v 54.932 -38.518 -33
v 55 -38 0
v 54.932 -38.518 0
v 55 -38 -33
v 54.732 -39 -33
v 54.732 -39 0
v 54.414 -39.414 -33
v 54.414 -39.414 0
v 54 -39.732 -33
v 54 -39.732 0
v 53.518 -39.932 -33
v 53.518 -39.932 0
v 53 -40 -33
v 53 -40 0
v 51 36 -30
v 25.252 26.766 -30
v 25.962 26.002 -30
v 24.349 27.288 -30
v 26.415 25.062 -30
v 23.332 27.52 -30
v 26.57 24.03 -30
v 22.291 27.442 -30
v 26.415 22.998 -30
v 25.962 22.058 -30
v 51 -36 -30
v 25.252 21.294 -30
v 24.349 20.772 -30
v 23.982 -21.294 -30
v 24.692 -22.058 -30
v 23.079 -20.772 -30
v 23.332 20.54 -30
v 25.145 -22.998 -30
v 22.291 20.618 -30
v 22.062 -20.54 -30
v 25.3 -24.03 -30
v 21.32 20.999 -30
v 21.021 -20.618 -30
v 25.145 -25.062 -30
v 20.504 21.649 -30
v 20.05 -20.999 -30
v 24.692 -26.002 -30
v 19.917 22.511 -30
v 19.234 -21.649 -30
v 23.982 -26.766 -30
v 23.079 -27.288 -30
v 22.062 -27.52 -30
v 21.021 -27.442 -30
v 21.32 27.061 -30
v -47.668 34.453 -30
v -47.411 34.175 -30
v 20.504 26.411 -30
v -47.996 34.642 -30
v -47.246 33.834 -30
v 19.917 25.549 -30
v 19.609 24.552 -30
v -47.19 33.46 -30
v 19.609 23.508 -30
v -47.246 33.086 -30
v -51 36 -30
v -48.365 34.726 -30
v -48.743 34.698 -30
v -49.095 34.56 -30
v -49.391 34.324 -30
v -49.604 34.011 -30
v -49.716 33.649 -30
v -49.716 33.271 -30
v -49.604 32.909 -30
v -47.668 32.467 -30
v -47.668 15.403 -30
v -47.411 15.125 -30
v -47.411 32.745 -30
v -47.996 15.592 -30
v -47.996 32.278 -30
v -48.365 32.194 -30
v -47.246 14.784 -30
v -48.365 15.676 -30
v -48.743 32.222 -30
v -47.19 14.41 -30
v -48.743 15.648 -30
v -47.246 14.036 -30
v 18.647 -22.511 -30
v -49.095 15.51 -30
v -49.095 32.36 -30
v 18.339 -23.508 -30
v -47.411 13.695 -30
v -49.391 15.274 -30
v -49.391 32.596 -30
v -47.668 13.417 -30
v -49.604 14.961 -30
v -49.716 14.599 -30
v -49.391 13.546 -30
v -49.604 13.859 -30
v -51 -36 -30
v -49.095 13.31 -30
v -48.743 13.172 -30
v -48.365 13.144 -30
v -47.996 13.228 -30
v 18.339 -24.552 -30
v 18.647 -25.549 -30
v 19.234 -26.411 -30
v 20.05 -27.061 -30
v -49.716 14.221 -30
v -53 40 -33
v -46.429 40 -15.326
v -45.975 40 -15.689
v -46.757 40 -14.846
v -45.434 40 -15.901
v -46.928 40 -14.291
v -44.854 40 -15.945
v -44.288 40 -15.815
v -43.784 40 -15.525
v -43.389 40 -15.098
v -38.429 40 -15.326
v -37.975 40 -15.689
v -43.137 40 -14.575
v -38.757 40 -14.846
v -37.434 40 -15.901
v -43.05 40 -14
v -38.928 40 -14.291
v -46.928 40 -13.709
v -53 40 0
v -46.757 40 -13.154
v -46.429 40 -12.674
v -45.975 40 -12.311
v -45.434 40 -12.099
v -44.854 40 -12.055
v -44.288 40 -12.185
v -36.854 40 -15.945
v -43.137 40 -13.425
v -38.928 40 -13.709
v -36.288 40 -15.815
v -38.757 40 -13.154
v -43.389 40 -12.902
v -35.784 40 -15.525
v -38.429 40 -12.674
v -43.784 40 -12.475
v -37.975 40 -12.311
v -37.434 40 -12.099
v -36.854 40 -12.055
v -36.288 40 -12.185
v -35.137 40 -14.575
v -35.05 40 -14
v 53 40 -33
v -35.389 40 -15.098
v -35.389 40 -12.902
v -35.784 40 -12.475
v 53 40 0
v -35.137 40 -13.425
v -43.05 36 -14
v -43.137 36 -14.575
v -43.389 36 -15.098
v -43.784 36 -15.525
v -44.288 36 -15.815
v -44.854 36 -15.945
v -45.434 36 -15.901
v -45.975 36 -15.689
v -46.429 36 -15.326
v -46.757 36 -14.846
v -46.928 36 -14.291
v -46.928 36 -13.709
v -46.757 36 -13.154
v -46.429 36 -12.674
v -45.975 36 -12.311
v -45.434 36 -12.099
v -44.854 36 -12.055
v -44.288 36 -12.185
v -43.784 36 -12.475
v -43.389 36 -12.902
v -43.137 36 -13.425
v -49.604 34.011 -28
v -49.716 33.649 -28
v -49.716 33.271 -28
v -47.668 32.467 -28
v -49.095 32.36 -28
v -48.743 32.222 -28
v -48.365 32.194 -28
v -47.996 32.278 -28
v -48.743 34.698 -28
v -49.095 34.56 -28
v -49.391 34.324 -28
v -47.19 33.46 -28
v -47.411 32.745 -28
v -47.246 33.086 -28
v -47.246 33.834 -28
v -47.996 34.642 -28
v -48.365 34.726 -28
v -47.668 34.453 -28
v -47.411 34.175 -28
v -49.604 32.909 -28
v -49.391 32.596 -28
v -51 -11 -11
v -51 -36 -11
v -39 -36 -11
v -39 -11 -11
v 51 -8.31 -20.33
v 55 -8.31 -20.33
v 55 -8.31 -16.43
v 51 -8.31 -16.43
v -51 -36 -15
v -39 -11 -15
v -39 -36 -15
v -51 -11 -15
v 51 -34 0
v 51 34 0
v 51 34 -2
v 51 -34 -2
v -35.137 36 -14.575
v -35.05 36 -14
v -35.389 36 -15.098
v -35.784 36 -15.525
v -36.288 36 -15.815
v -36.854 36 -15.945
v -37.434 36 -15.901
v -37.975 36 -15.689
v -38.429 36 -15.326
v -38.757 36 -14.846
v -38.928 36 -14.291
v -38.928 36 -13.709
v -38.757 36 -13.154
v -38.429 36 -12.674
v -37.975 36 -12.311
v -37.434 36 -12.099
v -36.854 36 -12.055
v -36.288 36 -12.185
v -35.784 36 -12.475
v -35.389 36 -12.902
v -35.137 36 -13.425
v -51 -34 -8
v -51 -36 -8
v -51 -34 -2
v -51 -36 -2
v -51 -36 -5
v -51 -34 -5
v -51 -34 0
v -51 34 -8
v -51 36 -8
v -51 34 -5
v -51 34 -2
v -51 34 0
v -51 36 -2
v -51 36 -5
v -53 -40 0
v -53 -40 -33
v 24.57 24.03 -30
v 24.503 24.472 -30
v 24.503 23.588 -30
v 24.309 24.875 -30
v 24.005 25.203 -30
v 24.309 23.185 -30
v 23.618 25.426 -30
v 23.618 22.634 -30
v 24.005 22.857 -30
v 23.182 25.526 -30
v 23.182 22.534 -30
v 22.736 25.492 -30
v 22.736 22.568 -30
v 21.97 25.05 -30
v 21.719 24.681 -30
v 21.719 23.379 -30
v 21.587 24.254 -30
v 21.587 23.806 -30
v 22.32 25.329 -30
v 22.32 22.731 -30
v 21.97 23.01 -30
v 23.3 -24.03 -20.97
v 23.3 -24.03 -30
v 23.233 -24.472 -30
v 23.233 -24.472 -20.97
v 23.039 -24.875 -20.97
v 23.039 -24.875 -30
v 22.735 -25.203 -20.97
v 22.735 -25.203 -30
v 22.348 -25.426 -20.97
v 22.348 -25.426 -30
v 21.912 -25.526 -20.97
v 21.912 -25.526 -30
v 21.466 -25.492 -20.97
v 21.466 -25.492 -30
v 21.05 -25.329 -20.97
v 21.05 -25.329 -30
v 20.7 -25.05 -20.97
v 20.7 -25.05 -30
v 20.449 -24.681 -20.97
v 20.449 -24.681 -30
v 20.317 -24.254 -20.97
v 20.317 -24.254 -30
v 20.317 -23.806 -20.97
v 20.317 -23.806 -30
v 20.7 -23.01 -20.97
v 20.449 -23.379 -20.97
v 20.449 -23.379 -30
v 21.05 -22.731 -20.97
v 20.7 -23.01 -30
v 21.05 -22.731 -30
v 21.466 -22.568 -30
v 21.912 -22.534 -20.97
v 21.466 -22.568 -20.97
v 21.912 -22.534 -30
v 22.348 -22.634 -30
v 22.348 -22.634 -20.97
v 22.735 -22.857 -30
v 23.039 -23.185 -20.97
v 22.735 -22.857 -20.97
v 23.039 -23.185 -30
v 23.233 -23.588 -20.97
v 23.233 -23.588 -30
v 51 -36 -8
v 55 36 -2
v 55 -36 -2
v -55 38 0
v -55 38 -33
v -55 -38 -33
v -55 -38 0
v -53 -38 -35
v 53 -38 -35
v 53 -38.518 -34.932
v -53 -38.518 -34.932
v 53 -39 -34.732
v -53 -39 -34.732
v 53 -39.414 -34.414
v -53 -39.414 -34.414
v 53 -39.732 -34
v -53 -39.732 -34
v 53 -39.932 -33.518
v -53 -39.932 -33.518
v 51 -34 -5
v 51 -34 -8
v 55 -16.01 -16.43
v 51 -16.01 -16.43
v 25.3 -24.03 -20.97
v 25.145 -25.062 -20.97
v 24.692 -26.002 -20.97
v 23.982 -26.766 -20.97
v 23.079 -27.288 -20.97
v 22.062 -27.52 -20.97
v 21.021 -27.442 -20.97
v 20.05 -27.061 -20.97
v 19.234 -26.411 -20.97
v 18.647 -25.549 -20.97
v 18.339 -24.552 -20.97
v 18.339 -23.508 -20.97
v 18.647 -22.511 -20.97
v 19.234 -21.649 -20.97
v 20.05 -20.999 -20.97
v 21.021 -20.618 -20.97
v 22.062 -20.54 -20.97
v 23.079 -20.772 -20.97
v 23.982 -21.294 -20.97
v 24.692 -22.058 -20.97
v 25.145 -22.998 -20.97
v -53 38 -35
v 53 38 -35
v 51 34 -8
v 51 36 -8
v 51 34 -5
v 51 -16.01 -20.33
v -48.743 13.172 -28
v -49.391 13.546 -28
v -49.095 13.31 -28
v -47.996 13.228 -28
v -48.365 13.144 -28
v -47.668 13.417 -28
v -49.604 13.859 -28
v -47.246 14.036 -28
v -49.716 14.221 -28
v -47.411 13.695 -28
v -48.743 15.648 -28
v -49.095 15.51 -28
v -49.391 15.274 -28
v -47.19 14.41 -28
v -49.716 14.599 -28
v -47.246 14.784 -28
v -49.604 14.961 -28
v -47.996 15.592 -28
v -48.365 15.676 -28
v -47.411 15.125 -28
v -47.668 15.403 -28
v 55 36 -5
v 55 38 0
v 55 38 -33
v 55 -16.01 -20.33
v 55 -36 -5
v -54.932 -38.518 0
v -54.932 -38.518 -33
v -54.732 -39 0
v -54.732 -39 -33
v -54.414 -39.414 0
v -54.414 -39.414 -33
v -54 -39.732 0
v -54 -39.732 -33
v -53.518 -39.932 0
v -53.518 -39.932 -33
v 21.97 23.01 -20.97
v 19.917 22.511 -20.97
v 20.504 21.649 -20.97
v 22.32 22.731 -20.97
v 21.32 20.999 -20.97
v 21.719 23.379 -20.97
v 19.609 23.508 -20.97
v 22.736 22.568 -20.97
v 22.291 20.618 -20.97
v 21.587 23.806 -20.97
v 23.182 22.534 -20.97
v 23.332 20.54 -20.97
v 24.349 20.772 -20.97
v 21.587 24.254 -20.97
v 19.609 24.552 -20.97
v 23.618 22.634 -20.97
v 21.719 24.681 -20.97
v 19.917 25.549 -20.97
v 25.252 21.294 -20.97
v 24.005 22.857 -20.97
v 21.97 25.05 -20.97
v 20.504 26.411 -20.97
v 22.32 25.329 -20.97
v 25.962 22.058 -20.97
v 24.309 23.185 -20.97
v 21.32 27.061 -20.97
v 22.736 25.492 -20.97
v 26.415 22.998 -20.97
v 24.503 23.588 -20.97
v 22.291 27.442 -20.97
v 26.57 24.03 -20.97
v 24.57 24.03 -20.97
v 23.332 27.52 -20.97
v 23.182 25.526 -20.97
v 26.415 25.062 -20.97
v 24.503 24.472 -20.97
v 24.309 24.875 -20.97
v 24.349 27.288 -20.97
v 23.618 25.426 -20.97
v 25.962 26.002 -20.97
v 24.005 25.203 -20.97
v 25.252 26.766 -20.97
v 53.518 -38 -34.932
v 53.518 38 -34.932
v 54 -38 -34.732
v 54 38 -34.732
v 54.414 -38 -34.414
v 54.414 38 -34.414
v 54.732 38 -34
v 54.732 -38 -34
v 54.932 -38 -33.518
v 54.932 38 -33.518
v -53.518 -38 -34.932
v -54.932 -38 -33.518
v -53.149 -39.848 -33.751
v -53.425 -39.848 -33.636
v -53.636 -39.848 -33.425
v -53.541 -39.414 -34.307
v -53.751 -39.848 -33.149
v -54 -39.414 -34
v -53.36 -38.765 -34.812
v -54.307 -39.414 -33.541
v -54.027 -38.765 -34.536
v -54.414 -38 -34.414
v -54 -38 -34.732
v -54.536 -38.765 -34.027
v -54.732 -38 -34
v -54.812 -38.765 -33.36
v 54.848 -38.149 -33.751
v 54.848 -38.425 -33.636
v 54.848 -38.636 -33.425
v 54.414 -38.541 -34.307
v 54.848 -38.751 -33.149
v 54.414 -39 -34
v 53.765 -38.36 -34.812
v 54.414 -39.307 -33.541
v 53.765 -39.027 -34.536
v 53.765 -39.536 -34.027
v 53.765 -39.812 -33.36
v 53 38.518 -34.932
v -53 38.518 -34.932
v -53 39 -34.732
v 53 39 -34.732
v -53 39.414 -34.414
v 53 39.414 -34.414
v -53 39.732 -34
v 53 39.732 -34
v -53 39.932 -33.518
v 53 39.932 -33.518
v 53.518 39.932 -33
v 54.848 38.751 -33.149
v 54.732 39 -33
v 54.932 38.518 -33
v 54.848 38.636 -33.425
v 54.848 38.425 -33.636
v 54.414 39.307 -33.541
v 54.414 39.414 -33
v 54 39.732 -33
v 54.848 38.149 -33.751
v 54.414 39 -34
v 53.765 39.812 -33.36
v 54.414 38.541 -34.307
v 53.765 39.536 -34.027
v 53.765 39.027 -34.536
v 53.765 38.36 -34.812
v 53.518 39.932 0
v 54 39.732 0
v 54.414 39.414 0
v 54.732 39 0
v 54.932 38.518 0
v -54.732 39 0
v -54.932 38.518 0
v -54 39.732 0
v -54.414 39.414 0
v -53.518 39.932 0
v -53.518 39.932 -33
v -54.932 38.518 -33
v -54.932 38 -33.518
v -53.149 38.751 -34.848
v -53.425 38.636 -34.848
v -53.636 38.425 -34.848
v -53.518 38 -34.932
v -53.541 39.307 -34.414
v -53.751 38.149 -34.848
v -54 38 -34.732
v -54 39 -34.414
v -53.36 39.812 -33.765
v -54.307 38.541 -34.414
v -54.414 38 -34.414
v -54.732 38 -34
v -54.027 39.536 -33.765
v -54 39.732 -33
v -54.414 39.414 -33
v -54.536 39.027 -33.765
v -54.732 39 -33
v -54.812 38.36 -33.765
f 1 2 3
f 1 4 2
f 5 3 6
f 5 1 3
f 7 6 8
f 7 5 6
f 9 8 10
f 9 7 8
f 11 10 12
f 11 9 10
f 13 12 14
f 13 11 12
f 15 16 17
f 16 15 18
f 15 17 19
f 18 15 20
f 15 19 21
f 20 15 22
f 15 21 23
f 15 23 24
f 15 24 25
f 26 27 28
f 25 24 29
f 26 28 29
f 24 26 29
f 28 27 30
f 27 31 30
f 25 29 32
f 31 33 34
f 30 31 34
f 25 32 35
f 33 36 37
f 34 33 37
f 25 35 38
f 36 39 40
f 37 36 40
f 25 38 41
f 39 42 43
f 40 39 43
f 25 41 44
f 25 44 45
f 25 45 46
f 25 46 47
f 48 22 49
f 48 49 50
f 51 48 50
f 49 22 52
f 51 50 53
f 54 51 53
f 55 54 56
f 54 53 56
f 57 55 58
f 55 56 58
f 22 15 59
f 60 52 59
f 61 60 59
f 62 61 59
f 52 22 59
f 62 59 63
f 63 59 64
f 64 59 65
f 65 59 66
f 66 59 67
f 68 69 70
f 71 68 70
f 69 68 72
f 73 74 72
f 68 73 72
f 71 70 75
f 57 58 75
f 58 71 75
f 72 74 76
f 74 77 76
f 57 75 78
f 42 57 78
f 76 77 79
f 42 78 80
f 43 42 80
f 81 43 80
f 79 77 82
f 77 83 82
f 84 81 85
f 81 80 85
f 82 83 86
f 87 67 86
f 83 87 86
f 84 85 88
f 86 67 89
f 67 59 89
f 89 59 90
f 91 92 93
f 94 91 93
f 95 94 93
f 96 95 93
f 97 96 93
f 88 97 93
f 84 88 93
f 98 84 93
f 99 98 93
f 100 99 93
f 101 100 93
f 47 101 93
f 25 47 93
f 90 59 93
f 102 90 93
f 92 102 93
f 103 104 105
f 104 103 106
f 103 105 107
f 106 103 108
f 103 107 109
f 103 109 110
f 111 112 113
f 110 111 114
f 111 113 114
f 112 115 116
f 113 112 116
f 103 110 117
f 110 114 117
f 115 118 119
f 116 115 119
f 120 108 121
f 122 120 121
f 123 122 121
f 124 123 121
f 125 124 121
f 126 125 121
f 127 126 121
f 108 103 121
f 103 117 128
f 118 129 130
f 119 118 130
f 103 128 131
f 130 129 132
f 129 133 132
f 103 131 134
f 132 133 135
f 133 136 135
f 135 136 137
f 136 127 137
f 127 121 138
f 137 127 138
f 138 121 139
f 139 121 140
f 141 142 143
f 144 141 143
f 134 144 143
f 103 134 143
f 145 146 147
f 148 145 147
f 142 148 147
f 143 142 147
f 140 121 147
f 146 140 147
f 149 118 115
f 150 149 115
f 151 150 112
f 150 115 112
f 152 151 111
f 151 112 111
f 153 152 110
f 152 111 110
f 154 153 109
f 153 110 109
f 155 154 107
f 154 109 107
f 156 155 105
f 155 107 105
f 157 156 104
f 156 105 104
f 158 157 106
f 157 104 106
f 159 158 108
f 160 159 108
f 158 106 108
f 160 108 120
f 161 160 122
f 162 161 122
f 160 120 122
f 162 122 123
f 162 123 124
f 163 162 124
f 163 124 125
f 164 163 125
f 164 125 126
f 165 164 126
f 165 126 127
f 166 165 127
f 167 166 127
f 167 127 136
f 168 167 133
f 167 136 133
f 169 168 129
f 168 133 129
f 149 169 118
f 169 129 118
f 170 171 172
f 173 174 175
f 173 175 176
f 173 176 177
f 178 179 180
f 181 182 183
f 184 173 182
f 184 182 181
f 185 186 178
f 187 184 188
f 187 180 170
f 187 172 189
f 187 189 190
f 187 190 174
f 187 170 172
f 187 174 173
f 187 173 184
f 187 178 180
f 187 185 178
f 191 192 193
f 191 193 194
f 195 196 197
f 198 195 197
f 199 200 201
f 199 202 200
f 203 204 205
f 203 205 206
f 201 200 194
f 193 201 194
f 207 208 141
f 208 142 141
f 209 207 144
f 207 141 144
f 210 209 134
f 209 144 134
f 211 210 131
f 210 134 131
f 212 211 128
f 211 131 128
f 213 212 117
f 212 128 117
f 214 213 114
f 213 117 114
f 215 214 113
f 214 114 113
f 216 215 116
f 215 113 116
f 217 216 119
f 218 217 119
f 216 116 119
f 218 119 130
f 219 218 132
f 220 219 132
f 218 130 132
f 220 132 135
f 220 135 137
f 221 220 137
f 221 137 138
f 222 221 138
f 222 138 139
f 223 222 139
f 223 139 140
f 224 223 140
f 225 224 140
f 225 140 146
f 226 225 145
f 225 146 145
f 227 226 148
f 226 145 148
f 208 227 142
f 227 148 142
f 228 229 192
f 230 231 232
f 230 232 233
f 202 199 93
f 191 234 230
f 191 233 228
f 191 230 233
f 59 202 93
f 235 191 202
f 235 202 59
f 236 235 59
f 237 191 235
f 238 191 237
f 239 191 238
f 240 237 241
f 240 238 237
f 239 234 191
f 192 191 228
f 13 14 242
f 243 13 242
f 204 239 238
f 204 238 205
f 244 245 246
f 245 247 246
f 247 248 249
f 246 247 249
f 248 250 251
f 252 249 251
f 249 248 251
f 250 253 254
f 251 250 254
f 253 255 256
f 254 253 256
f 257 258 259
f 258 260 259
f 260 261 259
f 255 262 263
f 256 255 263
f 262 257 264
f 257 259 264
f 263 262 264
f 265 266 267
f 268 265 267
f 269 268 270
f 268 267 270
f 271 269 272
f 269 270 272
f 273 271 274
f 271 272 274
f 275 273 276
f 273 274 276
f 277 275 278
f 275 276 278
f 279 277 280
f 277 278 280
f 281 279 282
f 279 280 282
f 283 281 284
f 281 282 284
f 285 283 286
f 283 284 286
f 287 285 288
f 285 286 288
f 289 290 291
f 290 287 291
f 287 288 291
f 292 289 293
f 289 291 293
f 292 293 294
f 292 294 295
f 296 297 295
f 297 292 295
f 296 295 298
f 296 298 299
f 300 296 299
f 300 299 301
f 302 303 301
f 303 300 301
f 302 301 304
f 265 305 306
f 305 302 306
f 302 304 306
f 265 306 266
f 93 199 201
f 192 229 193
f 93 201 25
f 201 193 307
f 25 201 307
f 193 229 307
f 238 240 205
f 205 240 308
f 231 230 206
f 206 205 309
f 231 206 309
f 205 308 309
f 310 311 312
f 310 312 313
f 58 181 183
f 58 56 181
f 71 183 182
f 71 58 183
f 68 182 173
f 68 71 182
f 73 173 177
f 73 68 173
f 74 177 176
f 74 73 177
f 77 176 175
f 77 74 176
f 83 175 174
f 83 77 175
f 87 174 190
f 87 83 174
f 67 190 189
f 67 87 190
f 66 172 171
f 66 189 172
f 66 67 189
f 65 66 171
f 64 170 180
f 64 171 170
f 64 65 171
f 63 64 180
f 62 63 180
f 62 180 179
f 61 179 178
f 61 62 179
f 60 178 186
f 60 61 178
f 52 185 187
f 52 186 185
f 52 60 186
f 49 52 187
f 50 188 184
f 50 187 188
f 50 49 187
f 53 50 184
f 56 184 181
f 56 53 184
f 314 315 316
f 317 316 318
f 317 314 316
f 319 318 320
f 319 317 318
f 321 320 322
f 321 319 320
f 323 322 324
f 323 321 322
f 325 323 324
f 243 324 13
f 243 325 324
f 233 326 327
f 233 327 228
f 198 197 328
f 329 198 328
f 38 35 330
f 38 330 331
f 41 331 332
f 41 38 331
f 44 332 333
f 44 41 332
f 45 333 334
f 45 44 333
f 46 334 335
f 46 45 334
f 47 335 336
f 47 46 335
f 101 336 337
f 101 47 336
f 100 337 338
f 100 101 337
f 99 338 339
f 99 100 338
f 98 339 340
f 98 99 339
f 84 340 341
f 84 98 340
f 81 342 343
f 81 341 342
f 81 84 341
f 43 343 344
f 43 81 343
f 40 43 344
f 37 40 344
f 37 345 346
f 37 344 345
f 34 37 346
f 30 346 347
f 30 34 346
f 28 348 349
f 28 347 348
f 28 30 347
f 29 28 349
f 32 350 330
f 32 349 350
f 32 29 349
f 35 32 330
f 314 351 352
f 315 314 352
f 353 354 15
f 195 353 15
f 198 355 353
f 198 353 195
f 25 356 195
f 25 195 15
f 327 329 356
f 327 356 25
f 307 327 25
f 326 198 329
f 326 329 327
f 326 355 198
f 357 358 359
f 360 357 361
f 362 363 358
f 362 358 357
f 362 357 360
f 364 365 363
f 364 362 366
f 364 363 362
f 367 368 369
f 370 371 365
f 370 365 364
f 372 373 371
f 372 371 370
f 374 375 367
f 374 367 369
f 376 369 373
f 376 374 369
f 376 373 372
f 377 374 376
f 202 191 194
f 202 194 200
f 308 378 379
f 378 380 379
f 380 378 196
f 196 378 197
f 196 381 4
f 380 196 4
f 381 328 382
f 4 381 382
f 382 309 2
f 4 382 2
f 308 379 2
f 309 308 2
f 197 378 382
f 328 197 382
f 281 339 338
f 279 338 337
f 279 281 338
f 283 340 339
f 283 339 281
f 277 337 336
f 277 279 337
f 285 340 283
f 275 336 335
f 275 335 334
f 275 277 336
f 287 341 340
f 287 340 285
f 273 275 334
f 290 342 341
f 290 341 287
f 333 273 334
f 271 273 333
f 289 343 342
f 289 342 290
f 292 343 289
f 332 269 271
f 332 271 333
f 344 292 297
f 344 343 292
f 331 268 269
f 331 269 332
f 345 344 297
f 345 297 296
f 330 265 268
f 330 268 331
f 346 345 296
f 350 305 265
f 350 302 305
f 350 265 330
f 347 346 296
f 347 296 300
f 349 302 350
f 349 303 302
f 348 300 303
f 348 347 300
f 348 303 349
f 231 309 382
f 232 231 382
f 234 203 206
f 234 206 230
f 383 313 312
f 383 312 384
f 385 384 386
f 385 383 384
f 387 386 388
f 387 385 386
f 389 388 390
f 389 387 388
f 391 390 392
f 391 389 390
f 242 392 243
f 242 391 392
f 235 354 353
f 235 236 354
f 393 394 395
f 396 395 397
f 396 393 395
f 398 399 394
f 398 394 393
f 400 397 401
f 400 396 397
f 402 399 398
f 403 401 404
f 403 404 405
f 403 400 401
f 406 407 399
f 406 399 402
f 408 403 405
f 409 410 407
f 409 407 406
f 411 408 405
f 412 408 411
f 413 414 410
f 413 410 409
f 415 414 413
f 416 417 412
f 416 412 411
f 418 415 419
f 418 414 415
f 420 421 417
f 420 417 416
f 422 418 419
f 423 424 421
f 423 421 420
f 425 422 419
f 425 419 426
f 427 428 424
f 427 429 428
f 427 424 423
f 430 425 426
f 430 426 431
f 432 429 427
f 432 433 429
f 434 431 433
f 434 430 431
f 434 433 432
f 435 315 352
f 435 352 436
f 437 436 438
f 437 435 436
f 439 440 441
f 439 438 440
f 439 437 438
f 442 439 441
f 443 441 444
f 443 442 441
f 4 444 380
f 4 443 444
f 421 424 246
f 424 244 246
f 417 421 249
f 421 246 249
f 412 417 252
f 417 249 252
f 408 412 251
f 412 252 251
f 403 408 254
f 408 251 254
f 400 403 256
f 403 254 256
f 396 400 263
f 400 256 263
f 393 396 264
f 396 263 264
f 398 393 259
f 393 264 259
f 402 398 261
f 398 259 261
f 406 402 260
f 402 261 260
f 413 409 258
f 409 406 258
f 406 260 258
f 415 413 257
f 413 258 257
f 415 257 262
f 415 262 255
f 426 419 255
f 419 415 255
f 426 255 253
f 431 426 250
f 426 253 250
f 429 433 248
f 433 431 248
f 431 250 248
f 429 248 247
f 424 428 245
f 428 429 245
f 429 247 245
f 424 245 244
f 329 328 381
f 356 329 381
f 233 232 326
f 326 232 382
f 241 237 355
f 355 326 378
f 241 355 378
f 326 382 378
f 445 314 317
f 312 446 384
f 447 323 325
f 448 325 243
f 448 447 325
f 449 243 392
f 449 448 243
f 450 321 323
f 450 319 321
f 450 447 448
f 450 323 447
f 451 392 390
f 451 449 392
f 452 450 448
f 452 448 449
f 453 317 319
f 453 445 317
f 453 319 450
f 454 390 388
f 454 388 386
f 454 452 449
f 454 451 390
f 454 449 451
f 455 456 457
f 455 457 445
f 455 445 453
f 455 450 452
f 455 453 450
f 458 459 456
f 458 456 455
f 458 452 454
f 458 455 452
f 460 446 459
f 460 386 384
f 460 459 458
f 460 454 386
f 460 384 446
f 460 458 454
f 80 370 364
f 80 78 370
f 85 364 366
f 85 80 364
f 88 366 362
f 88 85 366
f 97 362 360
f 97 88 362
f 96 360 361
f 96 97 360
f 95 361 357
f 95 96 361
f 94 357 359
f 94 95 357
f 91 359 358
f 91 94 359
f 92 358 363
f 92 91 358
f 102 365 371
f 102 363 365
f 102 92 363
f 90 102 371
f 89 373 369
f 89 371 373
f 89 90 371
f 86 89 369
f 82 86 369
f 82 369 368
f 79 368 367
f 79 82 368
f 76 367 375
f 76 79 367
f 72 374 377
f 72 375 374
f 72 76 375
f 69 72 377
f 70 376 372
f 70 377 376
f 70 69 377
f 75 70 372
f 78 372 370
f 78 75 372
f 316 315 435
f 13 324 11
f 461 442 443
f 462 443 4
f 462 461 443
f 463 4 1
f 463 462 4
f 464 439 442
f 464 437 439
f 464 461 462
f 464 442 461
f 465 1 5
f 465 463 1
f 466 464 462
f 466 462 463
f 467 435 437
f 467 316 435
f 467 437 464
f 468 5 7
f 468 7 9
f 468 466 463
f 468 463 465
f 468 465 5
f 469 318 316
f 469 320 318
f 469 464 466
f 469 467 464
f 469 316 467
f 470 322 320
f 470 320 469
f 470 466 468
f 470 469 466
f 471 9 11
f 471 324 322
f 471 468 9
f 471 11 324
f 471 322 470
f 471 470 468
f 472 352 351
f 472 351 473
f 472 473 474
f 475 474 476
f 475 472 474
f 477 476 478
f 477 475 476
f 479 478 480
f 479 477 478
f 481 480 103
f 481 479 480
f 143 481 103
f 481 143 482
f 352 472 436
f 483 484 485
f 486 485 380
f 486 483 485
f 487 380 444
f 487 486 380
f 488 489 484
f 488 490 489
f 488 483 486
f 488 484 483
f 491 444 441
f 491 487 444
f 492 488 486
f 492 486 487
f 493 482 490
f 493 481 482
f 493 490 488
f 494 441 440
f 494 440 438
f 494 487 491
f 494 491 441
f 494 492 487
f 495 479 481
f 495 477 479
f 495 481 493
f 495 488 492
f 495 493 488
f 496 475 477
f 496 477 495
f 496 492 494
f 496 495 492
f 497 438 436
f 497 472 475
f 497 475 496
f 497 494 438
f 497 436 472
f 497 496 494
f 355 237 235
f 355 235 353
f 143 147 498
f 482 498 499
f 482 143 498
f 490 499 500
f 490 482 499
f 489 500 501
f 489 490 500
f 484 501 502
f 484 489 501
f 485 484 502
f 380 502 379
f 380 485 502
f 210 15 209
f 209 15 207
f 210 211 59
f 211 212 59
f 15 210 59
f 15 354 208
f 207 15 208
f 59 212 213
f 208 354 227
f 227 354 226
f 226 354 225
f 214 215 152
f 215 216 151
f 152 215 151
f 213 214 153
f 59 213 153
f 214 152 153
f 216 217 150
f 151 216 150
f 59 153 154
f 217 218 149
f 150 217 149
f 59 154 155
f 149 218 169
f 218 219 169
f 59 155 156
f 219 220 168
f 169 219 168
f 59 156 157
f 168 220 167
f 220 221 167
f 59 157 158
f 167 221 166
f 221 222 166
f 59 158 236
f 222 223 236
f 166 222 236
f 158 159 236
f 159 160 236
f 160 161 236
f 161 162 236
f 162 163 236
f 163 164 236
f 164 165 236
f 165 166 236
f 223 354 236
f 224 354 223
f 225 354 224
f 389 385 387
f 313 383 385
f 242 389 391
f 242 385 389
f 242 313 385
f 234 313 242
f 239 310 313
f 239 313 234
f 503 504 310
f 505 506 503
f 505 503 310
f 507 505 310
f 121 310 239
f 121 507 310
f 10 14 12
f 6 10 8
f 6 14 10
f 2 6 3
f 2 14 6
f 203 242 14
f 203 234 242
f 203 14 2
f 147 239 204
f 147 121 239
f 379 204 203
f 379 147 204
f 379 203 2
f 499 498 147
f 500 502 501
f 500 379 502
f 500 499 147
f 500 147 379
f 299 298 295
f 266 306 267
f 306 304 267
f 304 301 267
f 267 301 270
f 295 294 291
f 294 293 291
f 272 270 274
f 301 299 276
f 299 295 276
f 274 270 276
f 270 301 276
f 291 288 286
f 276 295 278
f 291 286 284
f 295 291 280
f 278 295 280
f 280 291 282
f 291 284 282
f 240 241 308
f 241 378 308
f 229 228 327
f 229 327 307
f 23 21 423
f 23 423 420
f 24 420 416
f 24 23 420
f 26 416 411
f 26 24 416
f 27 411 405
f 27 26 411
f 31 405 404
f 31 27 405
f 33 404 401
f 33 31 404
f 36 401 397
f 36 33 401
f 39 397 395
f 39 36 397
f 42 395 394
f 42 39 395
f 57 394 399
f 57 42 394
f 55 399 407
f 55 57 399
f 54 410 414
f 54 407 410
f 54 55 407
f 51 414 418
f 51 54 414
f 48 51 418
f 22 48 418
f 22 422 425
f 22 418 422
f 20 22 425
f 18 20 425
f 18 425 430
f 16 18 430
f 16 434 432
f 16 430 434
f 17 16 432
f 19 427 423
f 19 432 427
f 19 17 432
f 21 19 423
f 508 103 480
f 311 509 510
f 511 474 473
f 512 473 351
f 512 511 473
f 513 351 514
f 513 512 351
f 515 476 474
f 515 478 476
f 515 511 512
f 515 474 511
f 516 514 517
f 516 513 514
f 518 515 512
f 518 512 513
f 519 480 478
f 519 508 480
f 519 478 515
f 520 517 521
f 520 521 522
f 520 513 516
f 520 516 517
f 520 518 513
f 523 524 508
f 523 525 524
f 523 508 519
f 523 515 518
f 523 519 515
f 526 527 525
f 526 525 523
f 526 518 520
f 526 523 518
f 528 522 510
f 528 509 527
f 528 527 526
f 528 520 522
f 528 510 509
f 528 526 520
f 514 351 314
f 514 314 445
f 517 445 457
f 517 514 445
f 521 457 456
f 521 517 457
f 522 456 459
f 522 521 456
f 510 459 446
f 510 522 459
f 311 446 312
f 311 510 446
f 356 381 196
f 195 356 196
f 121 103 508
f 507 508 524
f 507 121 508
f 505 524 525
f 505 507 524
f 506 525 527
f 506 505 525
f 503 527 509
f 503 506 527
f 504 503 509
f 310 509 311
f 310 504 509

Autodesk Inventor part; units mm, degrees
ref_plane "YZ Plane" through (0, 0, 0) normal (1, 0, 0) x (0, 1, 0)
ref_plane "XZ Plane" through (0, 0, 0) normal (0, 1, 0) x (-1, 0, 0)
ref_plane "XY Plane" through (0, 0, 0) normal (0, 0, 1) x (1, 0, 0)
sketch "Sketch1" plane through (0, 0, 0) normal (0, 0, 1) x (1, 0, 0)
  point P0 (0, 0)
sketch "Sketch2" plane through (0, 0, 0) normal (0, 0, 1) x (1, 0, 0)
  point P0 (0, 0)
sketch "Sketch3" plane through (0, 0, 0) normal (0, 0, 1) x (1, 0, 0)
  line L0 (-51, -36) -> (51, -36)
  line L1 (51, -36) -> (51, 36)
  line L2 (51, 36) -> (-51, 36)
  line L3 (-51, 36) -> (-51, -36)
  line L4 (-51, -36) -> (51, 36) construction
  line L5 (51, -36) -> (-51, 36) construction
  line L6 (-55, 40) -> (55, 40)
  line L7 (55, 40) -> (55, -40)
  line L8 (55, -40) -> (-55, -40)
  line L9 (-55, -40) -> (-55, 40)
  line L10 (-55, 40) -> (55, -40) construction
  line L11 (55, 40) -> (-55, -40) construction
  point P0 (0, 0)
  dimension "d0" = 102
  dimension "d1" = 72
  dimension "d2" = 110
  dimension "d3" = 80
extrude "Extrusion1" add sketch "Sketch3" against normal blind 35
sketch "Sketch4" plane through (51, -36, 0) normal (-1, 0, 0) x (0, 0, 1)
  point P0 (0, 36)
sketch "Sketch5" plane through (-55, -40, 0) normal (-1, 0, 0) x (0, 0, 1)
  line L0 (0, 80) -> (-35, 80) projected
  line L1 (0, 0) -> (-35, 0) projected
  line L2 (-35, 80) -> (-30, 80)
  line L3 (-30, 80) -> (-30, 0)
  line L4 (-30, 0) -> (-35, 0)
  line L5 (-35, 0) -> (-35, 80)
  point P0 (0, 40)
  point P1 (-30, 80)
  dimension "d6" = 5
extrude "Extrusion2" add sketch "Sketch5" against normal blind 110
fillet "Fillet1" radius 2 8 edges at (-55, 40, -17.5) (0, 40, -35) (55, 40, -17.5) (-55, 0, -35) (-55, -40, -17.5) (0, -40, -35) (55, 0, -35) (55, -40, -17.5)
sketch "Sketch6" plane through (55, -38, 0) normal (1, 0, 0) x (0, 0, -1)
  line L0 (3, 2) -> (7, 2)
  line L1 (7, 2) -> (7, 74)
  line L2 (7, 74) -> (3, 74)
  line L3 (3, 74) -> (3, 2)
  line L4 (3, 2) -> (7, 74) construction
  line L5 (7, 2) -> (3, 74) construction
  line L6 (0, 0) -> (0, 76) projected
  line L7 (33, 0) -> (0, 0) projected
  point P0 (0, 38)
  point P1 (5, 38)
  point P2 (5, 74)
  dimension "d26" = 3
  dimension "d27" = 2
  dimension "d28" = 72
  dimension "d29" = 4
extrude "Extrusion3" cut sketch "Sketch6" against normal blind 10
sketch "Sketch7" plane through (-51, 36, 0) normal (0, -1, 0) x (1, 0, 0)
  point P0 (51, 0)
sketch "Sketch11" plane through (-51, 36, -30) normal (0, 0, 1) x (1, 0, 0)
  circle A0 centre (2.54, -2.54) radius 1.27
  line L0 (0, 0) -> (102, 0) projected
  line L1 (0, -72) -> (0, 0) projected
  circle A1 centre (2.54, -21.59) radius 1.27
  point P0 (51, -36)
  dimension "d44" = 2.54
  dimension "d45" = 2.54
  dimension "d46" = 2.54
  dimension "d47" = 2.54
  dimension "d48" = 2.54
  dimension "d49" = 19.05
extrude "Extrusion6" add sketch "Sketch11" along normal blind 2
sketch "Sketch12" plane through (-55, -38, 0) normal (-1, 0, 0) x (0, 0, 1)
  point P0 (0, 38)
sketch "Sketch13" plane through (-55, -38, 0) normal (-1, 0, 0) x (0, 0, 1)
  line L0 (0, 76) -> (0, 0) projected
  line L1 (0, 76) -> (-8, 76)
  line L2 (-8, 76) -> (-8, 0)
  line L3 (-8, 0) -> (0, 0)
  line L4 (0, 0) -> (0, 76)
  point P0 (0, 38)
  point P1 (-4, 0)
  point P2 (-4, 76)
  dimension "d52" = 8
  dimension "d53" = 76
extrude "Extrusion7" add sketch "Sketch13" against normal blind 110
sketch "Sketch14" plane through (55, -38, 0) normal (1, 0, 0) x (0, 0, -1)
  line L0 (2, 2) -> (5, 2)
  line L1 (5, 2) -> (5, 74)
  line L2 (5, 74) -> (2, 74)
  line L3 (2, 74) -> (2, 2)
  line L4 (0, 0) -> (0, 76) projected
  line L5 (33, 0) -> (0, 0) projected
  point P0 (0, 38)
  point P1 (3.5, 2)
  dimension "d56" = 3
  dimension "d57" = 2
  dimension "d58" = 72
  dimension "d59" = 2
extrude "Extrusion8" cut sketch "Sketch14" against normal blind 106
sketch "Sketch15" plane through (0, 0, 0) normal (0, 0, 1) x (1, 0, 0)
  line L0 (-51, 34) -> (51, 34)
  line L1 (51, 34) -> (51, -34)
  line L2 (51, -34) -> (-51, -34)
  line L3 (-51, -34) -> (-51, 34)
  line L4 (-51, 34) -> (51, -34) construction
  line L5 (51, 34) -> (-51, -34) construction
  point P0 (0, 0)
  dimension "d62" = 102
  dimension "d63" = 68
extrude "Extrusion9" cut sketch "Sketch15" against normal blind 10
sketch "Sketch16" plane through (-51, -36, -30) normal (1, 0, 0) x (0, 0, -1)
  point P0 (-30, 36)
sketch "Sketch17" plane through (-55, -38, 0) normal (-1, 0, 0) x (0, 0, 1)
  line L0 (-11, 27) -> (-15, 27)
  line L1 (-15, 27) -> (-15, 2)
  line L2 (-15, 2) -> (-11, 2)
  line L3 (-11, 2) -> (-11, 27)
  line L4 (0, 76) -> (0, 0) projected
  line L5 (0, 0) -> (-33, 0) projected
  point P0 (0, 38)
  point P1 (-13, 2)
  point P2 (-13, 27)
  dimension "d96" = 11
  dimension "d97" = 2
  dimension "d98" = 4
  dimension "d99" = 25
extrude "Extrusion10" add sketch "Sketch17" against normal blind 16
sketch "Sketch18" plane through (-51, -36, -11) normal (0, 0, 1) x (1, 0, 0)
  point P0 (51, 36)
sketch "Sketch19" plane through (-51, 36, -30) normal (0, 0, 1) x (1, 0, 0)
  circle A0 centre (74.07, -11.97) radius 1.5
  line L0 (102, 0) -> (102, -72) projected
  line L1 (0, 0) -> (102, 0) projected
  circle A1 centre (72.8, -60.03) radius 1.5
  line L2 (102, -72) -> (0, -72) projected
  circle A2 centre (74.07, -11.97) radius 3.5
  circle A3 centre (72.8, -60.03) radius 3.5
  point P0 (51, -36)
  dimension "d102" = 3
  dimension "d103" = 27.93
  dimension "d104" = 11.97
  dimension "d105" = 3
  dimension "d106" = 29.2
  dimension "d107" = 11.97
  dimension "d108" = 7
  dimension "d109" = 7
extrude "Extrusion11" add sketch "Sketch19" along normal blind 9.03
sketch "Sketch20" plane through (-53, 40, 0) normal (0, 1, 0) x (1, 0, 0)
  point P0 (53, 0)
sketch "Sketch21" plane through (-53, 40, 0) normal (0, 1, 0) x (1, 0, 0)
  circle A0 centre (16, 14) radius 1.95
  line L0 (106, 0) -> (0, 0) projected
  line L1 (106, 33) -> (106, 0) projected
  circle A1 centre (8, 14) radius 1.95
  point P0 (53, 0)
  dimension "d116" = 3.9
  dimension "d117" = 14
  dimension "d118" = 90
  dimension "d119" = 3.9
  dimension "d120" = 8
  dimension "d121" = 14
extrude "Extrusion12" cut sketch "Sketch21" against normal blind 10
sketch "Sketch22" plane through (55, -38, 0) normal (1, 0, 0) x (0, 0, -1)
  line L0 (16.43, 21.99) -> (20.33, 21.99)
  line L1 (20.33, 21.99) -> (20.33, 29.69)
  line L2 (20.33, 29.69) -> (16.43, 29.69)
  line L3 (16.43, 29.69) -> (16.43, 21.99)
  line L4 (33, 0) -> (0, 0) projected
  line L5 (5, 74) -> (5, 2) projected
  point P0 (0, 38)
  point P1 (18.38, 21.99)
  point P2 (16.43, 25.84)
  dimension "d140" = 21.99
  dimension "d141" = 3.9
  dimension "d142" = 7.7
  dimension "d143" = 11.43
extrude "Extrusion13" cut sketch "Sketch22" against normal blind 10
sketch "Sketch8" plane through (-53, -40, 0) normal (0, -1, 0) x (1, 0, 0)
  line L0 (2, 0) -> (104, 0)
  line L1 (104, 0) -> (104, -3)
  line L2 (104, -3) -> (2, -3)
  line L3 (2, -3) -> (2, 0)
  line L4 (0, 0) -> (106, 0) projected
  line L5 (0, -33) -> (0, 0) projected
  point P0 (53, 0)
  point P1 (2, -1.5)
  point P2 (104, -1.5)
  dimension "d32" = 0
  dimension "d33" = 3
  dimension "d34" = 2
  dimension "d35" = 102
sketch "Sketch9" plane through (0, 0, 0) normal (0, 0, 1) x (1, 0, 0)
  line L0 (-51, 35) -> (51, 35)
  line L1 (51, 35) -> (51, -35)
  line L2 (51, -35) -> (-51, -35)
  line L3 (-51, -35) -> (-51, 35)
  line L4 (-51, 35) -> (51, -35) construction
  line L5 (51, 35) -> (-51, -35) construction
  point P0 (0, 0)
  dimension "d39" = 102
  dimension "d40" = 70
properties part number "BoxV2"
